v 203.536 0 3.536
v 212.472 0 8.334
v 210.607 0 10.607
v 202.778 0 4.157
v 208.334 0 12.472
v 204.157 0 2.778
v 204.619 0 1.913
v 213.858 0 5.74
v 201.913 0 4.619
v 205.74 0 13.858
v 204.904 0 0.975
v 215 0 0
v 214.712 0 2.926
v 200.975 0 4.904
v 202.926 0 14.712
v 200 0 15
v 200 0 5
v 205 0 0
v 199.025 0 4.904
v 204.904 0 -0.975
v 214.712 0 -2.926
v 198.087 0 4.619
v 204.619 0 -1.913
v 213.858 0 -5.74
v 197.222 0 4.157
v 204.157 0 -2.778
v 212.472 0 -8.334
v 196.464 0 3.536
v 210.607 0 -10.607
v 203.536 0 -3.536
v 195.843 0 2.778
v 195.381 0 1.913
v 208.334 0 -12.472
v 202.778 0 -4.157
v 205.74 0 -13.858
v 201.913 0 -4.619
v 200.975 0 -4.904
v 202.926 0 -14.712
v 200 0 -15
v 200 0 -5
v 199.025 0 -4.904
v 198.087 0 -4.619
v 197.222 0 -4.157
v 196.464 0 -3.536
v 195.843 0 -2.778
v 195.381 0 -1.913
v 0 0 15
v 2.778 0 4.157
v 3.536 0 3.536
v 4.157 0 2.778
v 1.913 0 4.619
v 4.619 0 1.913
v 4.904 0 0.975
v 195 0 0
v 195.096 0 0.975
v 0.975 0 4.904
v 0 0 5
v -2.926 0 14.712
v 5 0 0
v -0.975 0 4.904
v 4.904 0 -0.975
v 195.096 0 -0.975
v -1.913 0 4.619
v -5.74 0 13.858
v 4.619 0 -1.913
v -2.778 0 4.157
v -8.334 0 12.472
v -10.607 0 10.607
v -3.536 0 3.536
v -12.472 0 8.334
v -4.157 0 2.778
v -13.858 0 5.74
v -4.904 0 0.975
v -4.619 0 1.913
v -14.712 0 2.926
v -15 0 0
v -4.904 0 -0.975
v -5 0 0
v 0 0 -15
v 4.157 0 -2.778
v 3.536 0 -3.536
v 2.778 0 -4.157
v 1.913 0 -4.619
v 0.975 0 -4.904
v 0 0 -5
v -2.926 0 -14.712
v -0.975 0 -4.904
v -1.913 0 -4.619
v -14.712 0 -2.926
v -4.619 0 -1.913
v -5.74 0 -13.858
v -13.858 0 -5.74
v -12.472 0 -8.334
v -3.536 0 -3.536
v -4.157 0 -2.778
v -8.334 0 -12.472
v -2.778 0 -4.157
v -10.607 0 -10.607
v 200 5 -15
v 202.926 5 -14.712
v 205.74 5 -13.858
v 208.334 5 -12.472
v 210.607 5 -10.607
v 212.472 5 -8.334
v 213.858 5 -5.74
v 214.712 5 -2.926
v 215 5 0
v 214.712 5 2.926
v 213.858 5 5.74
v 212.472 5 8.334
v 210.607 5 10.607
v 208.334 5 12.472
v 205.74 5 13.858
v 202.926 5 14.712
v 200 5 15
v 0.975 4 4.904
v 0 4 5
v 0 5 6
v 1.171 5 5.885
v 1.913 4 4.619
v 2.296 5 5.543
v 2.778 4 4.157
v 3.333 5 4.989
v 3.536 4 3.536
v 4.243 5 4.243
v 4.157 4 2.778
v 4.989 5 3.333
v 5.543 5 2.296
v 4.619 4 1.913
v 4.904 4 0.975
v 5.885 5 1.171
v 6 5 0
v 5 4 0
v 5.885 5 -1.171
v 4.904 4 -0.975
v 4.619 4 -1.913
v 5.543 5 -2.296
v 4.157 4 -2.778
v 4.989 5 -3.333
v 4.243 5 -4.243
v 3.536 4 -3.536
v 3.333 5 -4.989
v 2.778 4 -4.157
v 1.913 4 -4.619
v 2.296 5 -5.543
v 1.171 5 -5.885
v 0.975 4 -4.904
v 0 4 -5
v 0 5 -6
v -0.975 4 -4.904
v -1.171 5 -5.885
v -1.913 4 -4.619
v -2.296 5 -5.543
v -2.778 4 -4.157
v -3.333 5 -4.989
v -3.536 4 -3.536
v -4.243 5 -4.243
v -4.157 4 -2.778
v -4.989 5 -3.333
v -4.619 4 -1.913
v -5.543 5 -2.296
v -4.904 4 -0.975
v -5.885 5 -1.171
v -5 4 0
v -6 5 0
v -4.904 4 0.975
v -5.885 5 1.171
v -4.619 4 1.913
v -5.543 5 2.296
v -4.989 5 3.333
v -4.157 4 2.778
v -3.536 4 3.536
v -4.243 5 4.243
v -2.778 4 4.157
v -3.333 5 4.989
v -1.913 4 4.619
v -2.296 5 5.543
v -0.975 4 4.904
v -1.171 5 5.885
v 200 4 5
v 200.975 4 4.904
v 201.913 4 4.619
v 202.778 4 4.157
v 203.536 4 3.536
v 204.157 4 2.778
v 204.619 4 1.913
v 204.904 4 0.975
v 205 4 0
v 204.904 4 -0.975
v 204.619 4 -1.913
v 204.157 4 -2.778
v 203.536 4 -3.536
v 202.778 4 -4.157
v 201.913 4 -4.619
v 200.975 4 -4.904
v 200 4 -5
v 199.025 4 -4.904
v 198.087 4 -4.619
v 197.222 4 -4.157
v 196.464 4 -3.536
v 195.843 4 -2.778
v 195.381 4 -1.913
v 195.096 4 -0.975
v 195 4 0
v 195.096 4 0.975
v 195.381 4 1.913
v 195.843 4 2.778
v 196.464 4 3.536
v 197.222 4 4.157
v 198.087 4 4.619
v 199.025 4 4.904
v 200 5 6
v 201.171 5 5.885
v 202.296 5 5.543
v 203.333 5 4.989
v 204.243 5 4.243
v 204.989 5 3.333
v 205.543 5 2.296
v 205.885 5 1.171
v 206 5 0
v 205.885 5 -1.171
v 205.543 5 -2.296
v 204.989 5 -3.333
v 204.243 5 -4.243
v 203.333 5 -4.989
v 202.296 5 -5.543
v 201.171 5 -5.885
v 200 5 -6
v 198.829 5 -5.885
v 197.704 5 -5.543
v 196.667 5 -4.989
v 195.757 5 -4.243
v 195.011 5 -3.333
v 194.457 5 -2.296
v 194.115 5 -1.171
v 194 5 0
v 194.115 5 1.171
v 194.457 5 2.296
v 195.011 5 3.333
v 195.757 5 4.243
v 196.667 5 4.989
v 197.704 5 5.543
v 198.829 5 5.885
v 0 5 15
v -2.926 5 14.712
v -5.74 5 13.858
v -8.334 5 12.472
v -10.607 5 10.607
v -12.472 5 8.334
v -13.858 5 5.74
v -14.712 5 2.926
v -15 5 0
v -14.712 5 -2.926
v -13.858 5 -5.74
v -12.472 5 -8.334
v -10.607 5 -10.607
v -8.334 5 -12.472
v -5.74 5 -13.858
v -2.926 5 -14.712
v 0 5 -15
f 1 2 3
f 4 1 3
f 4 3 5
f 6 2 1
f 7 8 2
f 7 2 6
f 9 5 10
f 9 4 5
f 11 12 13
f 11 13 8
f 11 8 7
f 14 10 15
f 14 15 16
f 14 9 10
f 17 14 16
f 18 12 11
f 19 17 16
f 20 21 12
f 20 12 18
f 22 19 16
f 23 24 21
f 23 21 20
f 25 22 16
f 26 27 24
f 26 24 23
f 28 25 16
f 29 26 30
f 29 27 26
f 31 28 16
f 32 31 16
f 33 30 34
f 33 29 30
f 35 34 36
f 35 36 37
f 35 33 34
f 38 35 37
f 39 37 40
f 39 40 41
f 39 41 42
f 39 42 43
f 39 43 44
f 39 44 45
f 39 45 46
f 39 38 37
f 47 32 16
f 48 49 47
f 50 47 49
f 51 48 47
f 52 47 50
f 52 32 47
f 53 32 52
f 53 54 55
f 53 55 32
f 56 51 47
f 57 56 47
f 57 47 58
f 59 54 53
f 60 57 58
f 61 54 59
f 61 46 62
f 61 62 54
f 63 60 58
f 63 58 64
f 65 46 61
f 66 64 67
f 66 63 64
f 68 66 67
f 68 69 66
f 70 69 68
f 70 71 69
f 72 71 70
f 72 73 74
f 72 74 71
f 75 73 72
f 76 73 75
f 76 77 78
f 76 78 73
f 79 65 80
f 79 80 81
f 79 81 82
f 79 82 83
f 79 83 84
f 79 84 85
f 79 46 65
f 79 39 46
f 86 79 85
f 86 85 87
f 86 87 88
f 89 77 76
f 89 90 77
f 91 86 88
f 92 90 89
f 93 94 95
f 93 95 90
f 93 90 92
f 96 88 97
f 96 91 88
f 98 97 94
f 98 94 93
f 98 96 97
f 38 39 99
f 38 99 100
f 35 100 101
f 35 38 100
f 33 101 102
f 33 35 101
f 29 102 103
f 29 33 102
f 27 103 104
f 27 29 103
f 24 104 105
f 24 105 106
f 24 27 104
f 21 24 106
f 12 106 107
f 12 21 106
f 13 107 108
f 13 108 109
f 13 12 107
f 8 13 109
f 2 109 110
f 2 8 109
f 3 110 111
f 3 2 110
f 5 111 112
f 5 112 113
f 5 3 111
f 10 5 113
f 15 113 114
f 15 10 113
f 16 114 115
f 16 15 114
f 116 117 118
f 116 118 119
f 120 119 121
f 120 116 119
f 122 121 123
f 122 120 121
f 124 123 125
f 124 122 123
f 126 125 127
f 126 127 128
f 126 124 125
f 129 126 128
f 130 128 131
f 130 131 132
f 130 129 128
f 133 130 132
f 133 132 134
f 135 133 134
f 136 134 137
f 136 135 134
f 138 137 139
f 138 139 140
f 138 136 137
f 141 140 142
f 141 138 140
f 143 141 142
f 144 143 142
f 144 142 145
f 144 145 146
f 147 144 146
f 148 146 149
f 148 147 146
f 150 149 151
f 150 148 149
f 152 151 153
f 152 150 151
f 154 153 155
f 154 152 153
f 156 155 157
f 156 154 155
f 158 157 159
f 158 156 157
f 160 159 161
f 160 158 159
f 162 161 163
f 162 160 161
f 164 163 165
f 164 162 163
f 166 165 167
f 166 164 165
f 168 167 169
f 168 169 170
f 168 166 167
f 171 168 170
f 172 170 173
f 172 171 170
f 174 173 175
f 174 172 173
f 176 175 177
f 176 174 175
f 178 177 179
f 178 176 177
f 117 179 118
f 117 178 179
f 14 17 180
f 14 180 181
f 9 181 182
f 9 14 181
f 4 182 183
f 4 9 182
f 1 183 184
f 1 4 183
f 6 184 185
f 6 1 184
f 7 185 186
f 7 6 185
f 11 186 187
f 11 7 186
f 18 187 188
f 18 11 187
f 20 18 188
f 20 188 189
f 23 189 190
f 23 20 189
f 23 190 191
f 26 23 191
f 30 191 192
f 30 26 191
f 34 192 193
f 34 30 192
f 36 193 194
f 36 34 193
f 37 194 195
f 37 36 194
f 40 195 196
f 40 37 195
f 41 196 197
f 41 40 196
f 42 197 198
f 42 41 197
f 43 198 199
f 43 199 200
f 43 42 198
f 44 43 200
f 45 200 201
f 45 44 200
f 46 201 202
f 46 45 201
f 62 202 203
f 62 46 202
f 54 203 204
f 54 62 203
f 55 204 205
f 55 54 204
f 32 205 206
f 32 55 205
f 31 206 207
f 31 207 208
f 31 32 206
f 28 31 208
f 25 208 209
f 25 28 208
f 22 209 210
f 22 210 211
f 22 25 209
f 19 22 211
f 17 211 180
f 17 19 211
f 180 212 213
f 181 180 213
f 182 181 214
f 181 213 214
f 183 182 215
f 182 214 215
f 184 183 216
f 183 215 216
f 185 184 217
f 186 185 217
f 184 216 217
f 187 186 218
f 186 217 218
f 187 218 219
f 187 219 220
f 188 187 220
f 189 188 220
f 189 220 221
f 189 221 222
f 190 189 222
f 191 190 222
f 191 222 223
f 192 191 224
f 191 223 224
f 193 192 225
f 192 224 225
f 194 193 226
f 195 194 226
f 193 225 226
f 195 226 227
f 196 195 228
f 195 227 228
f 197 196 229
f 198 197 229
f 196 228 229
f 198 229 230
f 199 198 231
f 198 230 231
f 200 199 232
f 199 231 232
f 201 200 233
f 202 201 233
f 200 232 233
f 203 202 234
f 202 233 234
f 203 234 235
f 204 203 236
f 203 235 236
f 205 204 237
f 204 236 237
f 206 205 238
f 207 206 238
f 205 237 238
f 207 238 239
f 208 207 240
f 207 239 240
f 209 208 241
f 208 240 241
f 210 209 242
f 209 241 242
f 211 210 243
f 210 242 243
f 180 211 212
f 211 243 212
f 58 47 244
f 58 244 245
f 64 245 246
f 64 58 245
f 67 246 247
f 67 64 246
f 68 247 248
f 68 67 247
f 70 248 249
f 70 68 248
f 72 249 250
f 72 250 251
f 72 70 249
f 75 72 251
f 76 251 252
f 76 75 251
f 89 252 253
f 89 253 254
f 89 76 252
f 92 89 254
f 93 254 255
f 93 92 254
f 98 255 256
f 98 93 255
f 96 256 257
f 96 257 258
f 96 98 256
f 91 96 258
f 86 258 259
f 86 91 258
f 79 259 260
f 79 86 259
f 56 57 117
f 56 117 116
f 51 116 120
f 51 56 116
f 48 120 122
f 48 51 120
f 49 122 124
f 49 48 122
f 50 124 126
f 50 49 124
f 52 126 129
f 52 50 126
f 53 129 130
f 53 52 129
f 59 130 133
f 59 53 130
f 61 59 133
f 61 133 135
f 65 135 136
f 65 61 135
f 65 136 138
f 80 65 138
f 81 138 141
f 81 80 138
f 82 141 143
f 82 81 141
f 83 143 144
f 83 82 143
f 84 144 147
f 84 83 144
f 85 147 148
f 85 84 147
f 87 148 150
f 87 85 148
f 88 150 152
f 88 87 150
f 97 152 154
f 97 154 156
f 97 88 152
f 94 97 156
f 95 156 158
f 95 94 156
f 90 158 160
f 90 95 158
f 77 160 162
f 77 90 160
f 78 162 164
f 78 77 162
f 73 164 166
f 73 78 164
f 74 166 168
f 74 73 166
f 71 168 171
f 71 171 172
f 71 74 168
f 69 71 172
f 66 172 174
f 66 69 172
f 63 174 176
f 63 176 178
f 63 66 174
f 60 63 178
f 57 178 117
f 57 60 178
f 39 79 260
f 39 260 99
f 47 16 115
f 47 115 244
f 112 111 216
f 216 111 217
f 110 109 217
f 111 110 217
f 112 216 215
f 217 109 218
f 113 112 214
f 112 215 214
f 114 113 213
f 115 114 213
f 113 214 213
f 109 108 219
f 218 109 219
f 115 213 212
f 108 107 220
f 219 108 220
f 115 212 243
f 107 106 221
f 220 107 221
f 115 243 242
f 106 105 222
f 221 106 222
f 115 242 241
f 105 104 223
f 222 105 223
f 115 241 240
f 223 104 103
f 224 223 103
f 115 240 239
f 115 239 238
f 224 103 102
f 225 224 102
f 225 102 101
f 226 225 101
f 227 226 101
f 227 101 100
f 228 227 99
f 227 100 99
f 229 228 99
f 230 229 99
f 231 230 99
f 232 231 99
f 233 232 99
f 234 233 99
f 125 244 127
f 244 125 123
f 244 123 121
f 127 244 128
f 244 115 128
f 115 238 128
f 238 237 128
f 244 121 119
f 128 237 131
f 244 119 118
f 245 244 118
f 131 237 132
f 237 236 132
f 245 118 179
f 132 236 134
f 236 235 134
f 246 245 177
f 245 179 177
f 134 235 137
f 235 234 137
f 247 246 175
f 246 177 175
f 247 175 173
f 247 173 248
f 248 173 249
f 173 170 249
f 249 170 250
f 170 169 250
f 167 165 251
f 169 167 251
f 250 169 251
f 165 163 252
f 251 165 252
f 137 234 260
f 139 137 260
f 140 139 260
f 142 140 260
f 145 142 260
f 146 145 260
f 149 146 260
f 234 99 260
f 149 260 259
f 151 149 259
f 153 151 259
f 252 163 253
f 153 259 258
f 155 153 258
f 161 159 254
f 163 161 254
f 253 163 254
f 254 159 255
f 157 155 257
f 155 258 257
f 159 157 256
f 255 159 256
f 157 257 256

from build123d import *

# Parameters (mm, degrees)
SKETCH1_R           = 5
BOSS_EXTRUDE1_DEPTH = 5
CHAMFER1_SIZE       = 1
CHAMFER2_SIZE       = 1


with BuildPart() as part:
    # Sketch1 → Boss-Extrude1 (new body)
    with BuildSketch(Plane(origin=(0, 0, 0), x_dir=(1, 0, 0), z_dir=(0, 1, 0))):
        with BuildLine():
            Line((0, 15), (200, 15))
            ThreePointArc((200, 15), (215, 0), (200, -15))
            Line((200, -15), (0, -15))
            ThreePointArc((0, -15), (-15, 0), (0, 15))
        make_face()
        with Locations(Location((0, 0, 0), (0, 0, 270))):
            Circle(SKETCH1_R, mode=Mode.SUBTRACT)
        with Locations(Location((200, 0, 0), (0, 0, 270))):
            Circle(SKETCH1_R, mode=Mode.SUBTRACT)
    extrude(amount=BOSS_EXTRUDE1_DEPTH)

    # Chamfer1
    chamfer1_edges = [part.edges().sort_by_distance(p)[0] for p in [
        (200, 5, -5),
    ]]
    chamfer(chamfer1_edges, length=CHAMFER1_SIZE)

    # Chamfer2
    chamfer2_edges = [part.edges().sort_by_distance(p)[0] for p in [
        (0, 5, -5),
    ]]
    chamfer(chamfer2_edges, length=CHAMFER2_SIZE)


solid = part.part
